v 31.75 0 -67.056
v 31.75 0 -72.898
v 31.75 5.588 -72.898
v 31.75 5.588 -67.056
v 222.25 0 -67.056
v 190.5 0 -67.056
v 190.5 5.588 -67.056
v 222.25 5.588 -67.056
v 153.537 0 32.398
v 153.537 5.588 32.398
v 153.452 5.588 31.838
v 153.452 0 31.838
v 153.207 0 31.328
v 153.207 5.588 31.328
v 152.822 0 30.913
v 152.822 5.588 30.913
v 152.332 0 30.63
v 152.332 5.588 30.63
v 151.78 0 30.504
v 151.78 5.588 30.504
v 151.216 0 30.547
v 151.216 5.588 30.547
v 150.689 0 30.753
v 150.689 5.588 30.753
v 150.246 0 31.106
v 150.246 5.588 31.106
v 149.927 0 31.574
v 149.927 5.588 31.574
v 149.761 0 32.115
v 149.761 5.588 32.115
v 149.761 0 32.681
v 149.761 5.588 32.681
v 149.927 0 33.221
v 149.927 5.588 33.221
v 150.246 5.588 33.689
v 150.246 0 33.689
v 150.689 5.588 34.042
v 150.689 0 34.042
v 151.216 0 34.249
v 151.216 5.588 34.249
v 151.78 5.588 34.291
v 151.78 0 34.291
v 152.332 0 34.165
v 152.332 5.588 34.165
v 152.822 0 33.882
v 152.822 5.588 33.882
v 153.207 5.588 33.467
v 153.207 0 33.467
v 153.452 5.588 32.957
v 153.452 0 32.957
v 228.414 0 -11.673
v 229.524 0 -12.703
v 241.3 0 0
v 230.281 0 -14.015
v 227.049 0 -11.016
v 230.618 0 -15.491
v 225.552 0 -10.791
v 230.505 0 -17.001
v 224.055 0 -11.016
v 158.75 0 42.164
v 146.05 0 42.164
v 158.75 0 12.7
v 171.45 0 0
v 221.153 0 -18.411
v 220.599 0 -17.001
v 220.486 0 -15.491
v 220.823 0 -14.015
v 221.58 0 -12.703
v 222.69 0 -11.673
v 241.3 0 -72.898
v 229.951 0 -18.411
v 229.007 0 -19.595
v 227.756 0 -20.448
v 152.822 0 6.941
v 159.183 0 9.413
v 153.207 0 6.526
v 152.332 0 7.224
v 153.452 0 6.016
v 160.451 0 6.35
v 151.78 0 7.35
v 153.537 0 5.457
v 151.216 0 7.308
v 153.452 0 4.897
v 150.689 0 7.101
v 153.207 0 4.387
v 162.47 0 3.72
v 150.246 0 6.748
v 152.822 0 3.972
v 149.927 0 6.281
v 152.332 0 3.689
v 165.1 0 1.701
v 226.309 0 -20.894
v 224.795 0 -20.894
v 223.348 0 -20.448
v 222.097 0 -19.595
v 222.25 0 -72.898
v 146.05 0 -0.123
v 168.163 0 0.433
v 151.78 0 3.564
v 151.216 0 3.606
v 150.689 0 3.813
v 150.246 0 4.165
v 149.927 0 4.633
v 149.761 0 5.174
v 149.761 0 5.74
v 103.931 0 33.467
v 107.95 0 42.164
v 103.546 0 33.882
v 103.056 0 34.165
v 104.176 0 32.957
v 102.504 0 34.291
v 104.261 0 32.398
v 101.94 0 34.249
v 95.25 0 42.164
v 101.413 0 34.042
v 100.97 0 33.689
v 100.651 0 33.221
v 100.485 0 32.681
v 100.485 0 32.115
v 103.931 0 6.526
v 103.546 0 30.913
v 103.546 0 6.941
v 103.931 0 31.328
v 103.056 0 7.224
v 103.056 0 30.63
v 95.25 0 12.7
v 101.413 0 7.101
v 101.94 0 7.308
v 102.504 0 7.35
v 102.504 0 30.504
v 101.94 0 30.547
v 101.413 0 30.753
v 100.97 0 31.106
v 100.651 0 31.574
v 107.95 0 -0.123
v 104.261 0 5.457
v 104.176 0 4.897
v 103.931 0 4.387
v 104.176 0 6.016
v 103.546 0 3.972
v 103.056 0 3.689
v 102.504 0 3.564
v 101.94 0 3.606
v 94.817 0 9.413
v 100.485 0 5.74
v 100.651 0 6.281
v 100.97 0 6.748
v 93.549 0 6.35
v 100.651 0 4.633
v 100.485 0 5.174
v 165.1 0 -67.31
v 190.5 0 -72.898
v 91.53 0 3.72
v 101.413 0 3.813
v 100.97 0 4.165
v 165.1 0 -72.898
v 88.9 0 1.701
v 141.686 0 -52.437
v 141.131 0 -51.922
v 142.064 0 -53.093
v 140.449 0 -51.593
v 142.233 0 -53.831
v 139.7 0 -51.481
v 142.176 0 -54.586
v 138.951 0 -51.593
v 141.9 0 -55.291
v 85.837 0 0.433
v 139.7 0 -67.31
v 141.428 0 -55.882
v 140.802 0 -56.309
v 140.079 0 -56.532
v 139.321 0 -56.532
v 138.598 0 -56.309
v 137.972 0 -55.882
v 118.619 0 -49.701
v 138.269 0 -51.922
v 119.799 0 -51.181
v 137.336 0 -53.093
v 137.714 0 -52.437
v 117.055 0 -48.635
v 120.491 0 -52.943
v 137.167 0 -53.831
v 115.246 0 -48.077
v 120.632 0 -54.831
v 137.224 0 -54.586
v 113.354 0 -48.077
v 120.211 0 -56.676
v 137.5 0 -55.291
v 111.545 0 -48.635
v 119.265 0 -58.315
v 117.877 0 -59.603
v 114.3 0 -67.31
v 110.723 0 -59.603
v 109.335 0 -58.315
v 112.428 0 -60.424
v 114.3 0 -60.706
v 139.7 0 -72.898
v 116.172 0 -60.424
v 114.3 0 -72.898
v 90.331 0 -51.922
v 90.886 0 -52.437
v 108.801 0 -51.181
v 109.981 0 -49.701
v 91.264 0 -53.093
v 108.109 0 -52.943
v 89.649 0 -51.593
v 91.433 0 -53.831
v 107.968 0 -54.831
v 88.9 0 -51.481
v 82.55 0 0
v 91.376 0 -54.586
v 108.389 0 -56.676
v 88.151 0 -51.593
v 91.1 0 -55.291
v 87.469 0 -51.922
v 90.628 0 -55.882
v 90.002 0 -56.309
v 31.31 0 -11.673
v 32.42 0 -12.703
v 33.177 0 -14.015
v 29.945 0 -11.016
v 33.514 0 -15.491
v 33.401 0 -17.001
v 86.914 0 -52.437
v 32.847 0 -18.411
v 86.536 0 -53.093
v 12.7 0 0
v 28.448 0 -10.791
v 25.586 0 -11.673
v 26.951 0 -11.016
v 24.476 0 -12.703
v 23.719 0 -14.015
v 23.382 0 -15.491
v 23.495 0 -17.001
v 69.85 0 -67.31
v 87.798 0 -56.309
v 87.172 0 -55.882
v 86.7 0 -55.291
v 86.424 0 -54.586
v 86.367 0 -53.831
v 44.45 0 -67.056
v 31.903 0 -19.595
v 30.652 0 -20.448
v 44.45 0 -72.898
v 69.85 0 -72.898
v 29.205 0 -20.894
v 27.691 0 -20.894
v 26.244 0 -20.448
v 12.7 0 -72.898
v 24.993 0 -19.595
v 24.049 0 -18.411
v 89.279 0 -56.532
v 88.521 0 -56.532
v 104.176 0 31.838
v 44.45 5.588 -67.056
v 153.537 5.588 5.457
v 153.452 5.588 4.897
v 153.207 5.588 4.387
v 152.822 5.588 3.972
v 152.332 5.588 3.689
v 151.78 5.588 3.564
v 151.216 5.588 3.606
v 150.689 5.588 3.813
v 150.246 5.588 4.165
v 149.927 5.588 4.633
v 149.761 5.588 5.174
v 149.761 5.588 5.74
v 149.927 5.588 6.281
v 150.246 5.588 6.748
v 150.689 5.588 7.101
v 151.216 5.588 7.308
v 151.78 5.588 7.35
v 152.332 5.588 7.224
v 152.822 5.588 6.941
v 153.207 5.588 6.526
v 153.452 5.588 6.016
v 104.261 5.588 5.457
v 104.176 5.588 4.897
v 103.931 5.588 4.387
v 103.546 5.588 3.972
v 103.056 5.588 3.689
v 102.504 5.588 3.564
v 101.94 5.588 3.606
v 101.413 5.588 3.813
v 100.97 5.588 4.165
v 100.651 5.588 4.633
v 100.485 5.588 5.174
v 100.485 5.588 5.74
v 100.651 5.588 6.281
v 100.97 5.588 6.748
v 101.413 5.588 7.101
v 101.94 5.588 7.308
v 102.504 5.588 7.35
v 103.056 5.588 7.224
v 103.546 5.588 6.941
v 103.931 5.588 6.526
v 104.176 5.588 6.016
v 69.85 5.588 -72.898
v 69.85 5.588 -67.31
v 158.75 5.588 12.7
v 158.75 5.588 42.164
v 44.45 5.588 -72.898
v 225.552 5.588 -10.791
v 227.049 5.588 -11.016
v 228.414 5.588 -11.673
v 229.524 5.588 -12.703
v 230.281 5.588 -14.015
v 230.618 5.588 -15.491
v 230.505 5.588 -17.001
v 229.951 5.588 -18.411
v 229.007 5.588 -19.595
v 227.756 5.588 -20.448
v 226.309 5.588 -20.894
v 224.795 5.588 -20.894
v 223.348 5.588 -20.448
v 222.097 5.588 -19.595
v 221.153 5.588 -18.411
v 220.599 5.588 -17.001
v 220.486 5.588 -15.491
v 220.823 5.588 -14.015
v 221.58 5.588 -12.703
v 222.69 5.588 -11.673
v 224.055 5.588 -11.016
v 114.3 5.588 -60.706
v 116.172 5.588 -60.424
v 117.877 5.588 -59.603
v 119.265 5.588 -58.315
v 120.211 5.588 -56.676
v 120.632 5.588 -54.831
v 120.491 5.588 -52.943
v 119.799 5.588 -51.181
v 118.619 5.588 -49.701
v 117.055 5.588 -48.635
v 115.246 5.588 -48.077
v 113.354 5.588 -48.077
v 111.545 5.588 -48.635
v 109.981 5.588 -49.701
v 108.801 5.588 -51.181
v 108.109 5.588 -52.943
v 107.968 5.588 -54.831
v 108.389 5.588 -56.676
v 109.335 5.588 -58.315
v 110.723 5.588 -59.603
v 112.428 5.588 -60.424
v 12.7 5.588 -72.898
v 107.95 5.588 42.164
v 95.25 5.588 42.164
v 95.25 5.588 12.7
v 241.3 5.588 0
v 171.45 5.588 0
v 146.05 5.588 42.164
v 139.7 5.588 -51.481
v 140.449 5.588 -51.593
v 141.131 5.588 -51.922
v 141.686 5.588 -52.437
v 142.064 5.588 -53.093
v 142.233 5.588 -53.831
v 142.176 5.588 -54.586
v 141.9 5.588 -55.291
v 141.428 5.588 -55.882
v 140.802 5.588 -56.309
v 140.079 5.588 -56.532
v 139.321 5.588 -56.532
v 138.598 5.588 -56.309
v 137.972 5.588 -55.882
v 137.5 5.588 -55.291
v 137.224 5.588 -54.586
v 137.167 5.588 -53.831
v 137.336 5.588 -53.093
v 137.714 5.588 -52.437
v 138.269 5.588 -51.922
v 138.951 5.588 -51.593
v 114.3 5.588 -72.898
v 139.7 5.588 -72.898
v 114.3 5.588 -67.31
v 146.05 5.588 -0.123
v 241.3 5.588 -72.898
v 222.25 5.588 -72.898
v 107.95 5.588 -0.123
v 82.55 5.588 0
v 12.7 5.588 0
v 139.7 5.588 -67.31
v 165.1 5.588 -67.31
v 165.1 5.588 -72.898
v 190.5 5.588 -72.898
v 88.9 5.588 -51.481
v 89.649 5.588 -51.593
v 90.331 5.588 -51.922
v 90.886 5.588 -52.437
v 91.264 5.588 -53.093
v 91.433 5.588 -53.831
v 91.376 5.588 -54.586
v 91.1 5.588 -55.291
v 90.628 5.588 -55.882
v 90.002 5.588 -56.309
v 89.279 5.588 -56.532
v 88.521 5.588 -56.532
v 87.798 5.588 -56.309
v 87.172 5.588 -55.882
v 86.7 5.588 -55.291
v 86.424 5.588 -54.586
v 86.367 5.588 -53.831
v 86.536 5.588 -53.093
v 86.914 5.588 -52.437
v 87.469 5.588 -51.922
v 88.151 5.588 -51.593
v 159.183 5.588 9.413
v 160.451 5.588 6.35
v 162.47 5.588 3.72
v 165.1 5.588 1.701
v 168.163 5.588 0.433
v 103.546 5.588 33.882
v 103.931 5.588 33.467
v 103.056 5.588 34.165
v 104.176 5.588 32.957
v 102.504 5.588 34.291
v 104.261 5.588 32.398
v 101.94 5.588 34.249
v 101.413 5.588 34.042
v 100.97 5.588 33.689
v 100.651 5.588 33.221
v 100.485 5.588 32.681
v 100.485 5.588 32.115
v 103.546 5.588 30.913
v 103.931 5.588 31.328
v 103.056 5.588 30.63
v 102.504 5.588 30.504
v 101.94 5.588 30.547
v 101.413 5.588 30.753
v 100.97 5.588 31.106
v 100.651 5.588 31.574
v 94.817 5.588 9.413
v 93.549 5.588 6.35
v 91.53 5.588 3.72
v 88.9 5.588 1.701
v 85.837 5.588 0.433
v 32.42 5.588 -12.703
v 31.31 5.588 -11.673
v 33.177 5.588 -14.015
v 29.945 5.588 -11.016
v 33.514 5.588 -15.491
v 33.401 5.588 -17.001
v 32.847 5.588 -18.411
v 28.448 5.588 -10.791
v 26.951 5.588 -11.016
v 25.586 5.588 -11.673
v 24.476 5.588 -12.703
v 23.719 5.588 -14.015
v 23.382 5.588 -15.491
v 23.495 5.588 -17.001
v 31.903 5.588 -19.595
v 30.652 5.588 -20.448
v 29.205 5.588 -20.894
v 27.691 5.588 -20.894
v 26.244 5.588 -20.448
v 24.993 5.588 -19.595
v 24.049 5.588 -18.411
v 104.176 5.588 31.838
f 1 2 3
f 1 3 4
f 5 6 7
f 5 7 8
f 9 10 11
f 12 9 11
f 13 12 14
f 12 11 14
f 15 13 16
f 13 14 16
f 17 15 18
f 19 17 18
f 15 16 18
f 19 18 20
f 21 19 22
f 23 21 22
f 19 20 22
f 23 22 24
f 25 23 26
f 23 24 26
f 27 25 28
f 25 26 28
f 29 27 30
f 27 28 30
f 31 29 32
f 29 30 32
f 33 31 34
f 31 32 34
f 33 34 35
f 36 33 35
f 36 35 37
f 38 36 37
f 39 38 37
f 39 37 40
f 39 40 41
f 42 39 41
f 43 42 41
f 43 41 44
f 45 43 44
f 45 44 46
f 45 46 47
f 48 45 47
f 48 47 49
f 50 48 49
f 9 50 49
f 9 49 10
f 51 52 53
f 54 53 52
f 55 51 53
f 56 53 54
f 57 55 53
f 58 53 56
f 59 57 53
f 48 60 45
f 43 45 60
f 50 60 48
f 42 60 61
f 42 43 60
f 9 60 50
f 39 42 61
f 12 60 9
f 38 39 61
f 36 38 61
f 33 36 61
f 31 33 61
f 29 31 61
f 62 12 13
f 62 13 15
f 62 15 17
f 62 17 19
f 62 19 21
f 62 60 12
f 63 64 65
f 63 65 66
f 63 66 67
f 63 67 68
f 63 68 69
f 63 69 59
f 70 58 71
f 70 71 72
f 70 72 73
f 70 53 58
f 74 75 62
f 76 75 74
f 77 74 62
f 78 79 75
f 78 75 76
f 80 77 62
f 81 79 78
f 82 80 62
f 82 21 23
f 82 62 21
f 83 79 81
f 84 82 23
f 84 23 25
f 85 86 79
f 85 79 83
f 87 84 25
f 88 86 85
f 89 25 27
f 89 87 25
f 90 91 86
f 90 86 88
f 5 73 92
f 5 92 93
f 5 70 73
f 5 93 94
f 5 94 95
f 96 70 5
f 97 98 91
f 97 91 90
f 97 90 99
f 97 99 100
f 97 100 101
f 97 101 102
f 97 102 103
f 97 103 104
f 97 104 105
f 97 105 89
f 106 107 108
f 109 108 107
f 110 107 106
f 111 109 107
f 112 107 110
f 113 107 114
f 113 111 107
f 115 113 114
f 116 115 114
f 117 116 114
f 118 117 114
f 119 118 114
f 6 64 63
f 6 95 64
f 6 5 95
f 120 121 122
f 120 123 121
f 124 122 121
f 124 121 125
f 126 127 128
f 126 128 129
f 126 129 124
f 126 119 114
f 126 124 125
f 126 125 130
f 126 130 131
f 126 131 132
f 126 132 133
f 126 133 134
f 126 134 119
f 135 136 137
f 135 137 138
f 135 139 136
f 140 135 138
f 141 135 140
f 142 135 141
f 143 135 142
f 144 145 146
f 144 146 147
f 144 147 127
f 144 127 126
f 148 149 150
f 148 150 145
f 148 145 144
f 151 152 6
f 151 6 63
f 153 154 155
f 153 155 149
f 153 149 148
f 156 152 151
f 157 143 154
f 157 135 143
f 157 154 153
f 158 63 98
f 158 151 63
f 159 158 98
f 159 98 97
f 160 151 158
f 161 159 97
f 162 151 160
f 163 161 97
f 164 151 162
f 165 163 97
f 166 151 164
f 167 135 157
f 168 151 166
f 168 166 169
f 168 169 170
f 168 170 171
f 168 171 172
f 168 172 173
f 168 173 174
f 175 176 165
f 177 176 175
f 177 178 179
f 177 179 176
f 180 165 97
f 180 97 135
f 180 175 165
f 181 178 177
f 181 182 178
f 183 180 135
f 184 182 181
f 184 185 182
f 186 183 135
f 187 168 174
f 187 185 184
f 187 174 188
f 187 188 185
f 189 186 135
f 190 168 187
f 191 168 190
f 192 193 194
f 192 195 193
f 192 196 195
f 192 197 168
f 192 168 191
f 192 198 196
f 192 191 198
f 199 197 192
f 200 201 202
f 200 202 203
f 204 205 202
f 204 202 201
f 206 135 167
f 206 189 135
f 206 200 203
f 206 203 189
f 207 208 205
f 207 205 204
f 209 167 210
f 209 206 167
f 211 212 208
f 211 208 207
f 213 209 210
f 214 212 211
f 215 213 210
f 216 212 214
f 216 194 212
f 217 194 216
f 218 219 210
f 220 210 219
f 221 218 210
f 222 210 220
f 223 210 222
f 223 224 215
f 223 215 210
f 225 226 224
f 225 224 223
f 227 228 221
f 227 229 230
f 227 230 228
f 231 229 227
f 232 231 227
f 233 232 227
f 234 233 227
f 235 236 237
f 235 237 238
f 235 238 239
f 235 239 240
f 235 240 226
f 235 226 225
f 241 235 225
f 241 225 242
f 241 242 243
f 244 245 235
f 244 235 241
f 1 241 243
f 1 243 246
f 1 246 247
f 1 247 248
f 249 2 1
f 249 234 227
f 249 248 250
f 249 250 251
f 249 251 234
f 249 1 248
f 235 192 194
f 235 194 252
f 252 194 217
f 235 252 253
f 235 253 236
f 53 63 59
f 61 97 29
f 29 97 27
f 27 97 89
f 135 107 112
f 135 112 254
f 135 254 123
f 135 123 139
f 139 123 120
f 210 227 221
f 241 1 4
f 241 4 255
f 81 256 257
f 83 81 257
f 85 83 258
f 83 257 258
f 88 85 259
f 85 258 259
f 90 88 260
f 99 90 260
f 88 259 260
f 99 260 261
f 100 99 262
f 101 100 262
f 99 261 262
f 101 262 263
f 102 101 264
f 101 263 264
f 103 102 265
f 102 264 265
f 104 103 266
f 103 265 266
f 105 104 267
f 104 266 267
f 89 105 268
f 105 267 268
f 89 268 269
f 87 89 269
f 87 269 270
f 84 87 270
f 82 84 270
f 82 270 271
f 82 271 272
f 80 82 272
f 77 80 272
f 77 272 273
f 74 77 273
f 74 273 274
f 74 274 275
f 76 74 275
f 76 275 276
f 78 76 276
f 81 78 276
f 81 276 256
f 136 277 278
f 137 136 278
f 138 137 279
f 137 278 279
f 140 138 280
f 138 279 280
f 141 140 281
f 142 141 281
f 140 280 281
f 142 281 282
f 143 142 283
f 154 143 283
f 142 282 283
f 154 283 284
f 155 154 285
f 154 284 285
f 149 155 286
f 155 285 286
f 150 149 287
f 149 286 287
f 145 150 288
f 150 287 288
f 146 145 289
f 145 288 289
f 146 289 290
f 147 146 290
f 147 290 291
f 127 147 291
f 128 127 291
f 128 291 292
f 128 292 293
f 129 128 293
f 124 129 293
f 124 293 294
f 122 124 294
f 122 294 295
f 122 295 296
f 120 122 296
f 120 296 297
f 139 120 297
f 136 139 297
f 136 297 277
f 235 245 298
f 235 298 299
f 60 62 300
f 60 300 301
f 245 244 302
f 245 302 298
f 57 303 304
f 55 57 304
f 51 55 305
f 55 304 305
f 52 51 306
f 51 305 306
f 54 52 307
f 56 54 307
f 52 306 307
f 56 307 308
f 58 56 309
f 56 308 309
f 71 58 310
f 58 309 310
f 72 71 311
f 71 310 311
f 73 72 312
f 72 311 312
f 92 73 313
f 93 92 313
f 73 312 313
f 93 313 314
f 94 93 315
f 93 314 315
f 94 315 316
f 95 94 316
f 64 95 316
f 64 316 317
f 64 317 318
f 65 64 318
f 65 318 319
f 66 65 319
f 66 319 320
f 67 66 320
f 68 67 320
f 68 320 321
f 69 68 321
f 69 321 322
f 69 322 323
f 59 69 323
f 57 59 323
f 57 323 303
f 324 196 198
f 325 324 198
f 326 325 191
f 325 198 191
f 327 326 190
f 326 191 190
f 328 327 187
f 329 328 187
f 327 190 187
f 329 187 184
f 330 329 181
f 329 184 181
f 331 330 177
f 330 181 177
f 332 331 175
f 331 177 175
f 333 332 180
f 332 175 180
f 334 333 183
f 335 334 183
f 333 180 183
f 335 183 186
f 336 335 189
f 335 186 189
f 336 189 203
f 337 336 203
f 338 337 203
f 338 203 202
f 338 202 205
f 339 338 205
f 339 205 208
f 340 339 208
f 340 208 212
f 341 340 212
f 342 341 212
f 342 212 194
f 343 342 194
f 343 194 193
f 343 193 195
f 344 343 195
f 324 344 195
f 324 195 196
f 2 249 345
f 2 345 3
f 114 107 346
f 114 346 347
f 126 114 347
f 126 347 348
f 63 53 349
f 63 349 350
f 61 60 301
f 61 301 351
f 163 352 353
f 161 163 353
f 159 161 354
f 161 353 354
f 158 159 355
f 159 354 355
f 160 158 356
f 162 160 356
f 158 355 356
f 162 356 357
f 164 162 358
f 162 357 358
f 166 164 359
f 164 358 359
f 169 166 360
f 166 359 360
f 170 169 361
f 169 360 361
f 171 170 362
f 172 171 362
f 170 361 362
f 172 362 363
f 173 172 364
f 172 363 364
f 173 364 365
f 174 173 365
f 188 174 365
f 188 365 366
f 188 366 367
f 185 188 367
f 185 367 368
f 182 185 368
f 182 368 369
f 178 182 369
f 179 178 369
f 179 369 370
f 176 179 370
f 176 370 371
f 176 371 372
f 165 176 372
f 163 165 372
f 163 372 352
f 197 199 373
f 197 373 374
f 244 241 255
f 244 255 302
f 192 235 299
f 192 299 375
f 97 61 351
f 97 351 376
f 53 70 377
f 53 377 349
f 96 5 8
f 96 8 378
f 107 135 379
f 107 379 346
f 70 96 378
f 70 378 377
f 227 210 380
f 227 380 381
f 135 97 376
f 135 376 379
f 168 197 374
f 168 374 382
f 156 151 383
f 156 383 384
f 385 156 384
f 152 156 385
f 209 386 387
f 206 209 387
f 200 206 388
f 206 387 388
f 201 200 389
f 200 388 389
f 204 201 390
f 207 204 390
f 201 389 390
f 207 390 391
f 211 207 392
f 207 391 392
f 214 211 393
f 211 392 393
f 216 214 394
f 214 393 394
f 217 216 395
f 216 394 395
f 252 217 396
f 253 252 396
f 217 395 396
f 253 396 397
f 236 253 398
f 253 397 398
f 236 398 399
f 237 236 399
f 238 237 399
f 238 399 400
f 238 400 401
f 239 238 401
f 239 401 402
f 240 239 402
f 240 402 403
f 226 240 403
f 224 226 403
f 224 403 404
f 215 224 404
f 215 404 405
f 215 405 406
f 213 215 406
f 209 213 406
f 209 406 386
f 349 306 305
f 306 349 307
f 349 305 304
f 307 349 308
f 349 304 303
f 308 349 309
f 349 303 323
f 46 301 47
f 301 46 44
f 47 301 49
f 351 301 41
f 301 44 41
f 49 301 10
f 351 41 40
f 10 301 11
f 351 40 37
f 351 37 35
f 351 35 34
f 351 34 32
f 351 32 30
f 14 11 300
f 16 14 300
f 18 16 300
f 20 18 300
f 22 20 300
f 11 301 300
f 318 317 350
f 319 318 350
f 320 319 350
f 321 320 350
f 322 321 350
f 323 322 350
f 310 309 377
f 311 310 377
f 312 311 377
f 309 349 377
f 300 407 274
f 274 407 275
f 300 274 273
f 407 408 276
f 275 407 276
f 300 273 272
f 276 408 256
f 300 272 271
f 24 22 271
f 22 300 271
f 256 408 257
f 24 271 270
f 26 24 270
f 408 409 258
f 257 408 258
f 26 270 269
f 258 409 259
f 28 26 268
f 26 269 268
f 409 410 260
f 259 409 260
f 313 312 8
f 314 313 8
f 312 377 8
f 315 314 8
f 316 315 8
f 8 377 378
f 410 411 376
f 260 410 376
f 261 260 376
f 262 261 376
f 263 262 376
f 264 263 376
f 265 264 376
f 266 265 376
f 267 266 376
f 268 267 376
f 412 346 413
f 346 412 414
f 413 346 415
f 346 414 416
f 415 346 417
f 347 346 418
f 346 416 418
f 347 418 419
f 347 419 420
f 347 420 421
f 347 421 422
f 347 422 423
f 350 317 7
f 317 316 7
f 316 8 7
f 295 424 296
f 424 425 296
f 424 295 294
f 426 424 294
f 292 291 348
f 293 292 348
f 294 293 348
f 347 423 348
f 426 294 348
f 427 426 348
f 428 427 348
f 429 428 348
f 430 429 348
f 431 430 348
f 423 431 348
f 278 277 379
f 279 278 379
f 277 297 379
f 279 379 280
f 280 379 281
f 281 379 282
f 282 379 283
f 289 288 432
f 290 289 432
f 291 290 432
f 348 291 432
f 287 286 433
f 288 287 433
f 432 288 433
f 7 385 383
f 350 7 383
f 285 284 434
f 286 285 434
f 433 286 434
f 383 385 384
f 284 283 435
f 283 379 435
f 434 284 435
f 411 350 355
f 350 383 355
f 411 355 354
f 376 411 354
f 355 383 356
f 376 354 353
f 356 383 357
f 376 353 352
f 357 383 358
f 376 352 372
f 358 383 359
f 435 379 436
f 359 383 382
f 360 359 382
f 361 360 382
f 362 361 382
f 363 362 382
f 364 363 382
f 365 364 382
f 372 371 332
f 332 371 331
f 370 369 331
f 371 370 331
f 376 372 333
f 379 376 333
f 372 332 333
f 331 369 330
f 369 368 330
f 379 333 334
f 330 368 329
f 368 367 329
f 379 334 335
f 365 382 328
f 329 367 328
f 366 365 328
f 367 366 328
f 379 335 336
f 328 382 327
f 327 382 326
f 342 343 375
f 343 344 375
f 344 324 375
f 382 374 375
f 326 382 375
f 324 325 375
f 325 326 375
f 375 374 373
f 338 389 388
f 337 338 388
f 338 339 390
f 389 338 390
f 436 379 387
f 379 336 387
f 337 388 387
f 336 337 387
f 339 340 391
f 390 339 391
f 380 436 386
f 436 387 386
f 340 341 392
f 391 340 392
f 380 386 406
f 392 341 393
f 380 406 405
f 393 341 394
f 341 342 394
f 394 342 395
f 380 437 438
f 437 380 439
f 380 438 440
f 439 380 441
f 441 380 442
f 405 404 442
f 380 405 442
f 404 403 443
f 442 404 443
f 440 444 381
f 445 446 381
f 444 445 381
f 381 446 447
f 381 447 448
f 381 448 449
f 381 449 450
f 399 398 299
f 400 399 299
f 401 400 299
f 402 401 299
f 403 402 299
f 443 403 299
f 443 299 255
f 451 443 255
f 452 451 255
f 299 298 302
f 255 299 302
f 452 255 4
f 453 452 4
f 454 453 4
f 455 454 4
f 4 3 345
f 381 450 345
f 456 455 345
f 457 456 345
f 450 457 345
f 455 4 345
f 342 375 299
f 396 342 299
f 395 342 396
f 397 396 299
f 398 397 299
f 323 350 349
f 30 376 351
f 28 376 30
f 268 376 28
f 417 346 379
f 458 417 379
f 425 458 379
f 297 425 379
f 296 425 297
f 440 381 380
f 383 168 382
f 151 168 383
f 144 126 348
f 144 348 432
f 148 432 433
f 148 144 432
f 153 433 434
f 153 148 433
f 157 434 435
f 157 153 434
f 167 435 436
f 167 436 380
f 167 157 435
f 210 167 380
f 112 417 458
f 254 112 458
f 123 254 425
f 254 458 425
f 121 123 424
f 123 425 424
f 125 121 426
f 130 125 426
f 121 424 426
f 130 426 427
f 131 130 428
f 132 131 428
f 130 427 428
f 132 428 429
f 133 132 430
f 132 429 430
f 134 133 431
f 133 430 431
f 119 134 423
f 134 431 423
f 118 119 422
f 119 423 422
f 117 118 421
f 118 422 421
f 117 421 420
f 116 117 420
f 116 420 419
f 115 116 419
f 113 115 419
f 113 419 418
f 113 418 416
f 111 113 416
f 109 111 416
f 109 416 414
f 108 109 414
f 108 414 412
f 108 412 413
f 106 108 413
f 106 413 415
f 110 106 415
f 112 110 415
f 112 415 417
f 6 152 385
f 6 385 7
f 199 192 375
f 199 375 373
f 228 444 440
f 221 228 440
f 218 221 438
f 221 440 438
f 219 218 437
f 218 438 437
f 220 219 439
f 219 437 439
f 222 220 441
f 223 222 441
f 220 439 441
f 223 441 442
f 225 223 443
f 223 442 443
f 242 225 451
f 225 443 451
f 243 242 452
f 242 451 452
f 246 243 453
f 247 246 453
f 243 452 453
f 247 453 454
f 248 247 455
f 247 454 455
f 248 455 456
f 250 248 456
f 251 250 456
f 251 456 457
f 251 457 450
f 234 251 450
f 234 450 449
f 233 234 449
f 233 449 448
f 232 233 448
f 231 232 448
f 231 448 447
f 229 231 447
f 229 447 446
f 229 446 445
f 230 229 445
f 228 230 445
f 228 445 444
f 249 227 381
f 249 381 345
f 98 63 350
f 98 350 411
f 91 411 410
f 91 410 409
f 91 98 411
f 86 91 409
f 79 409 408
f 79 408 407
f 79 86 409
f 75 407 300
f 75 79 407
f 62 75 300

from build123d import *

# Parameters (mm, degrees)
BOSS_EXTRUDE1_DEPTH   = 5.588
F_6_CLEARANCE_HOLE1_D = 3.7973
CUT_EXTRUDE1_REACH    = 254.133
SKETCH5_R             = 5.08
CUT_EXTRUDE2_REACH    = 254.133
SKETCH6_R             = 6.35
CUT_EXTRUDE3_REACH    = 254.133
SKETCH7_R             = 2.54


with BuildPart() as part:
    # Sketch1 → Boss-Extrude1 (new body)
    with BuildSketch(Plane(origin=(0, 0, 0), x_dir=(1, 0, 0), z_dir=(0, 1, 0))):
        with BuildLine():
            Line((12.7, 72.898), (31.75, 72.898))
            Line((31.75, 72.898), (31.75, 67.056))
            Line((31.75, 67.056), (44.45, 67.056))
            Line((44.45, 67.056), (44.45, 72.898))
            Line((44.45, 72.898), (69.85, 72.898))
            Line((69.85, 72.898), (69.85, 67.31))
            Line((69.85, 67.31), (114.3, 67.31))
            Line((114.3, 67.31), (114.3, 72.898))
            Line((114.3, 72.898), (139.7, 72.898))
            Line((139.7, 72.898), (139.7, 67.31))
            Line((139.7, 67.31), (165.1, 67.31))
            Line((165.1, 67.31), (165.1, 72.898))
            Line((165.1, 72.898), (190.5, 72.898))
            Line((190.5, 72.898), (190.5, 67.056))
            Line((190.5, 67.056), (222.25, 67.056))
            Line((222.25, 67.056), (222.25, 72.898))
            Line((222.25, 72.898), (241.3, 72.898))
            Line((241.3, 72.898), (241.3, 0))
            Line((241.3, 0), (171.45, 0))
            ThreePointArc((171.45, 0), (162.469743879, -3.719743879), (158.75, -12.7))
            Line((158.75, -12.7), (158.75, -42.164))
            Line((158.75, -42.164), (146.05, -42.164))
            Line((146.05, -42.164), (146.05, 0.122766638))
            Line((146.05, 0.122766638), (127, 0.122766638))
            Line((127, 0.122766638), (107.95, 0.122766638))
            Line((107.95, 0.122766638), (107.95, -42.164))
            Line((107.95, -42.164), (95.25, -42.164))
            Line((95.25, -42.164), (95.25, -12.7))
            ThreePointArc((95.25, -12.7), (91.530256121, -3.719743879), (82.55, 0))
            Line((82.55, 0), (12.7, 0))
            Line((12.7, 0), (12.7, 72.898))
        make_face()
    extrude(amount=BOSS_EXTRUDE1_DEPTH)

    # #6 Clearance Hole1 (through all)
    with Locations(Plane(origin=(0, 0, 0), x_dir=(-1, 0, 0), z_dir=(0, -1, 0))):
        with Locations((-102.362, -32.397617544), (-151.638, -32.397617544), (-151.638, -5.456849181), (-102.362, -5.456849181)):
            Hole(F_6_CLEARANCE_HOLE1_D / 2)

    # Sketch5 → Cut-Extrude1 (cut, up to next)
    with BuildSketch(Plane(origin=(0, 5.588, 0), x_dir=(1, 0, 0), z_dir=(0, 1, 0)), mode=Mode.PRIVATE) as cut_extrude1_sk1:
        with Locations(Location((225.552, 15.870766638, 0), (0, 0, 270))):
            Circle(SKETCH5_R)
    cut_extrude1_tool1 = extrude(cut_extrude1_sk1.sketch, amount=-CUT_EXTRUDE1_REACH, mode=Mode.PRIVATE) & part.part
    # Sketch5 → Cut-Extrude1 (cut, up to next)
    with BuildSketch(Plane(origin=(0, 5.588, 0), x_dir=(1, 0, 0), z_dir=(0, 1, 0)), mode=Mode.PRIVATE) as cut_extrude1_sk2:
        with Locations(Location((28.448, 15.870766638, 0), (0, 0, 270))):
            Circle(SKETCH5_R)
    cut_extrude1_tool2 = extrude(cut_extrude1_sk2.sketch, amount=-CUT_EXTRUDE1_REACH, mode=Mode.PRIVATE) & part.part
    add(cut_extrude1_tool1.solids().sort_by_distance((225.552, 5.588, -15.870767))[0], mode=Mode.SUBTRACT)
    add(cut_extrude1_tool2.solids().sort_by_distance((28.448, 5.588, -15.870767))[0], mode=Mode.SUBTRACT)

    # Sketch6 → Cut-Extrude2 (cut, up to next)
    with BuildSketch(Plane.XZ, mode=Mode.PRIVATE) as cut_extrude2_sk1:
        with Locations(Location((114.3, -54.356, 0), (0, 0, 270))):
            Circle(SKETCH6_R)
    cut_extrude2_tool1 = extrude(cut_extrude2_sk1.sketch, amount=-CUT_EXTRUDE2_REACH, mode=Mode.PRIVATE) & part.part
    add(cut_extrude2_tool1.solids().sort_by_distance((114.3, 0, -54.356))[0], mode=Mode.SUBTRACT)

    # Sketch7 → Cut-Extrude3 (cut, up to next)
    with BuildSketch(Plane(origin=(0, 5.588, 0), x_dir=(1, 0, 0), z_dir=(0, 1, 0)), mode=Mode.PRIVATE) as cut_extrude3_sk1:
        with Locations(Location((139.7, 54.020508314, 0), (0, 0, 270))):
            Circle(SKETCH7_R)
    cut_extrude3_tool1 = extrude(cut_extrude3_sk1.sketch, amount=-CUT_EXTRUDE3_REACH, mode=Mode.PRIVATE) & part.part
    # Sketch7 → Cut-Extrude3 (cut, up to next)
    with BuildSketch(Plane(origin=(0, 5.588, 0), x_dir=(1, 0, 0), z_dir=(0, 1, 0)), mode=Mode.PRIVATE) as cut_extrude3_sk2:
        with Locations(Location((88.9, 54.020508314, 0), (0, 0, 270))):
            Circle(SKETCH7_R)
    cut_extrude3_tool2 = extrude(cut_extrude3_sk2.sketch, amount=-CUT_EXTRUDE3_REACH, mode=Mode.PRIVATE) & part.part
    add(cut_extrude3_tool1.solids().sort_by_distance((139.7, 5.588, -54.020508))[0], mode=Mode.SUBTRACT)
    add(cut_extrude3_tool2.solids().sort_by_distance((88.9, 5.588, -54.020508))[0], mode=Mode.SUBTRACT)


solid = part.part
